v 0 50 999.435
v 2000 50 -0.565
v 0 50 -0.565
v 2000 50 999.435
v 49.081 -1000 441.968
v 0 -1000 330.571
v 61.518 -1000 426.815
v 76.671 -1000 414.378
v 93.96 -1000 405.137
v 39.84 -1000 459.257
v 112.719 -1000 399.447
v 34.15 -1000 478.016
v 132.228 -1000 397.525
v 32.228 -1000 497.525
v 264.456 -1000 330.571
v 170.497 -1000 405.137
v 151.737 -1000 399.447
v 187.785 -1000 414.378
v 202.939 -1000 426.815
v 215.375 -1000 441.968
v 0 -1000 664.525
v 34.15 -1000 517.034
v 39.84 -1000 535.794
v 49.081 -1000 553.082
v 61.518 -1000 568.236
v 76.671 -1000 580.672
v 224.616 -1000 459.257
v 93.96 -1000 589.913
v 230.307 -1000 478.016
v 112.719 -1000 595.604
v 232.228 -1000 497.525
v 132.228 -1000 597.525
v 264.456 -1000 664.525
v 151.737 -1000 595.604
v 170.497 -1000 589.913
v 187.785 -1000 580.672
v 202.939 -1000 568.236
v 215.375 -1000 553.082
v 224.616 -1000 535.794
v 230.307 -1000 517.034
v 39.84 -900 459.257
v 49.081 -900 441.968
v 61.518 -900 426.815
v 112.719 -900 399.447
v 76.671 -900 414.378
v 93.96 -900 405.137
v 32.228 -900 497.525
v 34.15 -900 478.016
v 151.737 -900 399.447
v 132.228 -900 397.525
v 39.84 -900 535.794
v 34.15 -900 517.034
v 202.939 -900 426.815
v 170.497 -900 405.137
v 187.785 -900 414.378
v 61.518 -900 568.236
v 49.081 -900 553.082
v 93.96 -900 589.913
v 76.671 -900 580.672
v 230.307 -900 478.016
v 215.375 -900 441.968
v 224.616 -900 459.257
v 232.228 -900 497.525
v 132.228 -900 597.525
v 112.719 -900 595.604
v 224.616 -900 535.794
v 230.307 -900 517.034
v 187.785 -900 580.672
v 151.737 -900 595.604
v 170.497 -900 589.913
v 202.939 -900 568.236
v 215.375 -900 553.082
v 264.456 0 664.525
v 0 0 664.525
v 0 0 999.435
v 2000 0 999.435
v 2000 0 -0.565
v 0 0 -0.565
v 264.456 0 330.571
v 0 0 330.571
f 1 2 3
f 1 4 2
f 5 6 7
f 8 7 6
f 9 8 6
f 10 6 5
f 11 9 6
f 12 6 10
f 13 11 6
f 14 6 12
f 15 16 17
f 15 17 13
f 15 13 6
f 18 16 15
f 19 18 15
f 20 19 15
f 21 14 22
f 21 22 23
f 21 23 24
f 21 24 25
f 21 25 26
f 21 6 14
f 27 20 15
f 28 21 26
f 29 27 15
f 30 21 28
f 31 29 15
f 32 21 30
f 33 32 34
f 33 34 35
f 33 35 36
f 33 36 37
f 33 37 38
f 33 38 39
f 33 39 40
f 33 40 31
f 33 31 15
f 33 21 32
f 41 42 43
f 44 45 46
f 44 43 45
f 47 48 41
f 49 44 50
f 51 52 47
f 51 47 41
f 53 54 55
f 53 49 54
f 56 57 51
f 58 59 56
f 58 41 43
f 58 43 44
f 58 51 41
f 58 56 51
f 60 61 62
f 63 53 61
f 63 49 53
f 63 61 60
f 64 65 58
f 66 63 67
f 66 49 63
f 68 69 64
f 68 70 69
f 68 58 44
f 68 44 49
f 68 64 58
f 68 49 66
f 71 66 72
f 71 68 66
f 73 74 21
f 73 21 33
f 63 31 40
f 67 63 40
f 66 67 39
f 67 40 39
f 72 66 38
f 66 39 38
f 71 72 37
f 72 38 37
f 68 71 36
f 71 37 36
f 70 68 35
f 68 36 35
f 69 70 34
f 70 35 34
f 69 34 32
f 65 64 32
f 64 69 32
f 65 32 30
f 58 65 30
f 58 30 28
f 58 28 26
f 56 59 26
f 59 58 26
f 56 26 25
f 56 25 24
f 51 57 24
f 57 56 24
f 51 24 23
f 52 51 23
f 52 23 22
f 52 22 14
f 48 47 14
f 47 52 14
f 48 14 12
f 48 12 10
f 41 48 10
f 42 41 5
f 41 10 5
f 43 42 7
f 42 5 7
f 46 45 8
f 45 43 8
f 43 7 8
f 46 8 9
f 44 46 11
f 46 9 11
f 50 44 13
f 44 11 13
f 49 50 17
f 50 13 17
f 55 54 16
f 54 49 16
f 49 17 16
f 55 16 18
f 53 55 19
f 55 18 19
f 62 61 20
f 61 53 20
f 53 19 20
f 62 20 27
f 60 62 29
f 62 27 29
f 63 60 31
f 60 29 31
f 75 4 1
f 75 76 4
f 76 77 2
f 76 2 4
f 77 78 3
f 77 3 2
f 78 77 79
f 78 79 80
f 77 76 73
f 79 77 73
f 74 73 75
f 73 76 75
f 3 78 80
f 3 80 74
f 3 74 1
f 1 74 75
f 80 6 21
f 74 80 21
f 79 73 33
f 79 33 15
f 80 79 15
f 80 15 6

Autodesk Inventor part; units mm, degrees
ref_plane "YZ Plane" through (0, 0, 0) normal (1, 0, 0) x (0, 1, 0)
ref_plane "XZ Plane" through (0, 0, 0) normal (0, 1, 0) x (-1, 0, 0)
ref_plane "XY Plane" through (0, 0, 0) normal (0, 0, 1) x (1, 0, 0)
sketch "Sketch1" plane through (0, 0, 0) normal (0, 1, 0) x (-1, 0, 0)
  line L0 (1000, 0) -> (1000, -0.5649)
  line L1 (1000, -0.5649) -> (0, -0.5649)
  line L2 (0, -0.5649) -> (0, 0)
  line L3 (0, -0.5649) -> (-2000, -0.5649)
  line L4 (-2000, -0.5649) -> (-2000, 999.4351)
  line L5 (-2000, 999.4351) -> (0, 999.4351)
  line L6 (0, 999.4351) -> (0, -0.5649)
  dimension "d1" = 2000
  dimension "d2" = 1000
extrude "Extrusion1" add sketch "Sketch1" along normal blind 50
sketch "Sketch2" plane through (0, 0, 0) normal (0, -1, 0) x (1, 0, 0)
  point P0 (0, 0)
sketch "Sketch3" plane through (0, 0, 0) normal (0, -1, 0) x (1, 0, 0)
  line L0 (98.4679, 994.5253) -> (98.4679, 664.5253)
  line L1 (98.4679, 330.5706) -> (98.4679, 0)
  line L2 (0, -0.5649) -> (0, 999.4351) projected
  line L3 (0, 664.5253) -> (264.4565, 664.5253)
  line L4 (264.4565, 664.5253) -> (264.4565, 330.5706)
  line L5 (264.4565, 330.5706) -> (0, 330.5706)
  line L6 (0, 330.5706) -> (0, 664.5253)
  point P0 (0, 0)
  dimension "d5" = 330
extrude "Extrusion2" add sketch "Sketch3" along normal blind 1000
sketch "Sketch4" plane through (0, -1000, 0) normal (0, -1, 0) x (1, 0, 0)
  line L0 (0, 664.5253) -> (264.4565, 664.5253) projected
  line L1 (132.2283, 664.5253) -> (132.2283, 497.5253)
  circle A0 centre (132.2283, 497.5253) radius 100
  point P0 (0, 0)
  dimension "d8" = 167
  dimension "d9" = 200
extrude "Extrusion3" cut sketch "Sketch4" against normal blind 100
sketch "Sketch5" plane through (0, 0, 0) normal (0, -1, 0) x (1, 0, 0)
  point P0 (0, 0)
equation "\"BendRadius\" = Thickness"
equation "\"BendReliefWidth\" = Thickness"
equation "\"BendReliefDepth\" = 0.5 * Thickness"
equation "\"CornerReliefSize\" = 4 * Thickness"
equation "\"MinimumRemnant\" = 2 * Thickness"
equation "\"TransitionRadius\" = BendRadius"
equation "\"JacobiRadiusSize\" = BendRadius"
equation "\"GapSize\" = Thickness"
equation "\"Thickness\" = 3.048"
